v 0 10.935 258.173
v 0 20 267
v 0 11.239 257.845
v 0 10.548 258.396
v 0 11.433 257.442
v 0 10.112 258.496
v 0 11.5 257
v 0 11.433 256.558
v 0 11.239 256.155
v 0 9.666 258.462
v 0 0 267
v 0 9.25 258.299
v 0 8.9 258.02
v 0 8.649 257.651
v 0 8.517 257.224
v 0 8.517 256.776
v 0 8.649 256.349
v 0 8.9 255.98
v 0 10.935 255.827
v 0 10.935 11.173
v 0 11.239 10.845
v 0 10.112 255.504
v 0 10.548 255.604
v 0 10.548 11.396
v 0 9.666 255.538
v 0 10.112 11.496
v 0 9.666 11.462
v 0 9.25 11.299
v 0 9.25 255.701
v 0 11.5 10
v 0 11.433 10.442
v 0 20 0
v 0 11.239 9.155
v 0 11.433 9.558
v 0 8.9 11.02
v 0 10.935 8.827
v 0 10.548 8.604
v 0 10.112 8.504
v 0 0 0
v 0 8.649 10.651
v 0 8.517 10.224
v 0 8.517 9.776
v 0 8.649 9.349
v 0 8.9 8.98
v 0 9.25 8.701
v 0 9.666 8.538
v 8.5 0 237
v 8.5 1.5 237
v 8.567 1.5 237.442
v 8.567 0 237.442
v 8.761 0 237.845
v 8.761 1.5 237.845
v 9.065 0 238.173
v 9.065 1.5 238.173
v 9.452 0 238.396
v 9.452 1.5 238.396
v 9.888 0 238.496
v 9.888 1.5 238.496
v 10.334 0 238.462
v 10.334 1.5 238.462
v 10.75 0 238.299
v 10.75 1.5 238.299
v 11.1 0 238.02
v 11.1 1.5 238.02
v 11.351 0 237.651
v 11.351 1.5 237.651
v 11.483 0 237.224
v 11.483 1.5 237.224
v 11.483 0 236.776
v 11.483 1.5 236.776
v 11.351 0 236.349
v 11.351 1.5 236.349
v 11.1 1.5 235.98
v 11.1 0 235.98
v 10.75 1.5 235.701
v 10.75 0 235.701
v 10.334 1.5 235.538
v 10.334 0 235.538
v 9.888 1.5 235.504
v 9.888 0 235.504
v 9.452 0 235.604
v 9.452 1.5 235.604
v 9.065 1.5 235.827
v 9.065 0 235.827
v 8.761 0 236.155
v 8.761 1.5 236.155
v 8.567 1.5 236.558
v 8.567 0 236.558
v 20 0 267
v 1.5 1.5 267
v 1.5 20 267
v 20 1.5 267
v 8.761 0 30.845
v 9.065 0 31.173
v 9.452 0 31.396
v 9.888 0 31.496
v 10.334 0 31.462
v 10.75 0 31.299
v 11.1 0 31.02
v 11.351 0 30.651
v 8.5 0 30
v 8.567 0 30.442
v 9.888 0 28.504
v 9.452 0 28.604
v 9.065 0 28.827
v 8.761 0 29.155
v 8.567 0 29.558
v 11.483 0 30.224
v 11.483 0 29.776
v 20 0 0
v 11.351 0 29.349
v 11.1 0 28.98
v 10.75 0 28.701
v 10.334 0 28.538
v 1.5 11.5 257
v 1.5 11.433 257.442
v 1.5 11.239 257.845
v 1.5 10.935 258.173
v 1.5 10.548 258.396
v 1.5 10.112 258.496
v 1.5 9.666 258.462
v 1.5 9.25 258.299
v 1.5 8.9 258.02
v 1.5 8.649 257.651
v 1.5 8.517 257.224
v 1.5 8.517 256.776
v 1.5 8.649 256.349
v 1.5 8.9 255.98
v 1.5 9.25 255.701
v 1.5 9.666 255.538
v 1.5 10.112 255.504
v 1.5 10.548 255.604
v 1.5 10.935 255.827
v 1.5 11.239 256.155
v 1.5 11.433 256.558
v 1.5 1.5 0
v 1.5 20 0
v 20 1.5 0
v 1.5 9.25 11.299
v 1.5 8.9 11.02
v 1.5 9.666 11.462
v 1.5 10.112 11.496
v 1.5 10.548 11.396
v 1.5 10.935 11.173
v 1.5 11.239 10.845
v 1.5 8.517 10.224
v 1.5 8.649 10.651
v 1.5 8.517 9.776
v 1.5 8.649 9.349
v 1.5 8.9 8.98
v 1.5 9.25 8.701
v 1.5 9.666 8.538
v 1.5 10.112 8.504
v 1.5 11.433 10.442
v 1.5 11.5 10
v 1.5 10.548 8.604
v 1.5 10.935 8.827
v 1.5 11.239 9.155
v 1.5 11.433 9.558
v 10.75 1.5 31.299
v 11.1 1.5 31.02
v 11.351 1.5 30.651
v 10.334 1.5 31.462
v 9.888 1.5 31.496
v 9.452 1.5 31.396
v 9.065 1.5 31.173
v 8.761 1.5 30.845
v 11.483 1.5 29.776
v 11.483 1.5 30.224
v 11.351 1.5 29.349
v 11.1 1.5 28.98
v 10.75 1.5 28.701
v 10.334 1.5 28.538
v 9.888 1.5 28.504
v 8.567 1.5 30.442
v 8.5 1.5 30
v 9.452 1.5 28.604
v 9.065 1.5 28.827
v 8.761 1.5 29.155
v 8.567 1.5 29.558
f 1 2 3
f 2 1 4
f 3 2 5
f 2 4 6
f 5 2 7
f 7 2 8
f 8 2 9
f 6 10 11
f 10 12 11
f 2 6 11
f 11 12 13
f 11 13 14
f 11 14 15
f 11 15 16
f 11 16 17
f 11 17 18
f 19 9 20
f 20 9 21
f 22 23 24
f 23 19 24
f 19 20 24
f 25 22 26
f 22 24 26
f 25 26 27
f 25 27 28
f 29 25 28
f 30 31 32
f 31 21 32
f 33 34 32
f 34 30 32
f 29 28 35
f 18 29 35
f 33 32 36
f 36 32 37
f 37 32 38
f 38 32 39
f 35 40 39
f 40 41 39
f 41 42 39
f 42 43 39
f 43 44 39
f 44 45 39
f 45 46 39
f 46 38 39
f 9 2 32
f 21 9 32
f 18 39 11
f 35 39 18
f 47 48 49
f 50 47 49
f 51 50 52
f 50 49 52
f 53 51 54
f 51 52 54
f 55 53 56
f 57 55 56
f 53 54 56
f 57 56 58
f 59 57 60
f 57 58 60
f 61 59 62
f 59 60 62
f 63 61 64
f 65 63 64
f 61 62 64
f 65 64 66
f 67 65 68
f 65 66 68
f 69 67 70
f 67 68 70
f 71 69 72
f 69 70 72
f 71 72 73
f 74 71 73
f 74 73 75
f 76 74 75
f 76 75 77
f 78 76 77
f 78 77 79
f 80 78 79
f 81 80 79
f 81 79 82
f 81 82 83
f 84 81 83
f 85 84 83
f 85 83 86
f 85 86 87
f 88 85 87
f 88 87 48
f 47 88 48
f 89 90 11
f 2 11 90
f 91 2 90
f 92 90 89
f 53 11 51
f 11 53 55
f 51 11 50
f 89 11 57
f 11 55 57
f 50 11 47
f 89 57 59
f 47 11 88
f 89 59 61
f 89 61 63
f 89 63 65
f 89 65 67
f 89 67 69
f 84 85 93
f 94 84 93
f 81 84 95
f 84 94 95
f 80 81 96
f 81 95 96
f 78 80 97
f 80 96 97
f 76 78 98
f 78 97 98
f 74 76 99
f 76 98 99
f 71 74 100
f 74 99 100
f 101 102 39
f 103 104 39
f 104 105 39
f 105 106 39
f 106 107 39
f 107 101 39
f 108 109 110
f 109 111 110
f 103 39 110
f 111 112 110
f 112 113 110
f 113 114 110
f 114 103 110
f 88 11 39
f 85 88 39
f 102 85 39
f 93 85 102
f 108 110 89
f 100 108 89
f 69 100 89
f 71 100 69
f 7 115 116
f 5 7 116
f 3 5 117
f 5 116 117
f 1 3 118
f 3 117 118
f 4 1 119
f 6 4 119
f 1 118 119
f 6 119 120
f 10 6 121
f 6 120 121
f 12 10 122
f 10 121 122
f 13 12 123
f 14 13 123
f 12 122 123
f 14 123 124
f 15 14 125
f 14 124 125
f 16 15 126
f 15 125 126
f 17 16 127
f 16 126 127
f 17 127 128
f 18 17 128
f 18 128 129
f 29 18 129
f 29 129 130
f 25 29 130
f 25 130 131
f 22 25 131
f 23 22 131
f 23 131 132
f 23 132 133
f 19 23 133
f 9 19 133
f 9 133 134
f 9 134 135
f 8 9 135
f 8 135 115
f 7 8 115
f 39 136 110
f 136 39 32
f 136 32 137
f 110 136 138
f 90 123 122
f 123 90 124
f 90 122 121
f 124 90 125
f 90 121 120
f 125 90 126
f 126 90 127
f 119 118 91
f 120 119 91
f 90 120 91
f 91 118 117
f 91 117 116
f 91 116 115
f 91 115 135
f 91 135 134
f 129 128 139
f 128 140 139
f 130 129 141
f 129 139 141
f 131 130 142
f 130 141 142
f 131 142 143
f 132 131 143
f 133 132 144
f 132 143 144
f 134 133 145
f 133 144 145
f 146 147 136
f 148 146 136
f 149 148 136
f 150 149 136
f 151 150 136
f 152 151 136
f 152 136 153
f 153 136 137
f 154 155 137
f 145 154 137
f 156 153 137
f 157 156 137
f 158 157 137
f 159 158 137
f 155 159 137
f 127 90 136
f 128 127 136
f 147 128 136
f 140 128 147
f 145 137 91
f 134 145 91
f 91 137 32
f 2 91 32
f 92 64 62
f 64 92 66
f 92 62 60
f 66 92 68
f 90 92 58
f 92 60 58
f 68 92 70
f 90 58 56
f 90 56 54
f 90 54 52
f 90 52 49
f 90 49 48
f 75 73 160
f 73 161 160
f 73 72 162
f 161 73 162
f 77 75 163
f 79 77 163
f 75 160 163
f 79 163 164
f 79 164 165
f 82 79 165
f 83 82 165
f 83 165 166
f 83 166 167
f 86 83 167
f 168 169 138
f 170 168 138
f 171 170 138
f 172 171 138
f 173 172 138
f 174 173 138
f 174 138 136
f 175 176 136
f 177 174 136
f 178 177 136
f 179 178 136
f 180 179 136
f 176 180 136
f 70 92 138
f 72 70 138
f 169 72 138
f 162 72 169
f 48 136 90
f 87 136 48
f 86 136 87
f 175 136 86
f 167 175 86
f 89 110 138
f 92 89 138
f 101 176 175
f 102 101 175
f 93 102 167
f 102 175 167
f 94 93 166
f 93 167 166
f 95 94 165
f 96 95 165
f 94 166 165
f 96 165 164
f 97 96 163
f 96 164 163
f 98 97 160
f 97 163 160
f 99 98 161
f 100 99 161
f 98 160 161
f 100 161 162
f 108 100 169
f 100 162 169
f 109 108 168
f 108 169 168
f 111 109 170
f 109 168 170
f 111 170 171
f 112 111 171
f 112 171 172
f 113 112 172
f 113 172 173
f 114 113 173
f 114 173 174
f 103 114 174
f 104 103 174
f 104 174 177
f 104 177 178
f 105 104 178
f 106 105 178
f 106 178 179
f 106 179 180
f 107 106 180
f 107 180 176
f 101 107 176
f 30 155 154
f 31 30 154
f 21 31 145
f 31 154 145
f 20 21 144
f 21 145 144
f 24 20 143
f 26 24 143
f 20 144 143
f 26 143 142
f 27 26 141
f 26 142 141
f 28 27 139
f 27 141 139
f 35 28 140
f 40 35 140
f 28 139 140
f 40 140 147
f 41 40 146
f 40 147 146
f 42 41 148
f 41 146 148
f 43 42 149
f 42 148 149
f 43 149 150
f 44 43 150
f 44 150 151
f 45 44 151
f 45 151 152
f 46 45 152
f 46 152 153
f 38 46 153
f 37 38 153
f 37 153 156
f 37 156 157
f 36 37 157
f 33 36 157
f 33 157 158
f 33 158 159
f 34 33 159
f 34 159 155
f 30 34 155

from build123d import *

# Parameters (mm, degrees)
EXTRUSION1_DEPTH = 267
ESQUISSE2_R      = 1.5
EXTRUSION2_DEPTH = 269.38638192
ESQUISSE3_R      = 1.5
EXTRUSION3_DEPTH = 264


with BuildPart() as part:
    # Esquisse1 → Extrusion1 (new body)
    with BuildSketch(Plane.XY):
        Polygon((0, 0), (20, 0), (20, 1.5), (1.5, 1.5), (1.5, 20), (0, 20), align=None)
    extrude(amount=EXTRUSION1_DEPTH)

    # Esquisse2 → Extrusion2 (cut, through all)
    with BuildSketch(Plane(origin=(0, 1.5, 0), x_dir=(1, 0, 0), z_dir=(0, 1, 0))):
        with Locations(Location((10, -30, 0), (0, 0, 180))):
            Circle(ESQUISSE2_R)
        with Locations(Location((10, -237, 0), (0, 0, 180))):
            Circle(ESQUISSE2_R)
    extrude(amount=-EXTRUSION2_DEPTH, mode=Mode.SUBTRACT)

    # Esquisse3 → Extrusion3 (cut)
    with BuildSketch(Plane(origin=(1.5, 0, 0), x_dir=(0, 0, -1), z_dir=(1, 0, 0))):
        with Locations(Location((-257, 10, 0), (0, 0, 90))):
            Circle(ESQUISSE3_R)
        with Locations(Location((-10, 10, 0), (0, 0, 90))):
            Circle(ESQUISSE3_R)
    extrude(amount=-EXTRUSION3_DEPTH, mode=Mode.SUBTRACT)


solid = part.part
